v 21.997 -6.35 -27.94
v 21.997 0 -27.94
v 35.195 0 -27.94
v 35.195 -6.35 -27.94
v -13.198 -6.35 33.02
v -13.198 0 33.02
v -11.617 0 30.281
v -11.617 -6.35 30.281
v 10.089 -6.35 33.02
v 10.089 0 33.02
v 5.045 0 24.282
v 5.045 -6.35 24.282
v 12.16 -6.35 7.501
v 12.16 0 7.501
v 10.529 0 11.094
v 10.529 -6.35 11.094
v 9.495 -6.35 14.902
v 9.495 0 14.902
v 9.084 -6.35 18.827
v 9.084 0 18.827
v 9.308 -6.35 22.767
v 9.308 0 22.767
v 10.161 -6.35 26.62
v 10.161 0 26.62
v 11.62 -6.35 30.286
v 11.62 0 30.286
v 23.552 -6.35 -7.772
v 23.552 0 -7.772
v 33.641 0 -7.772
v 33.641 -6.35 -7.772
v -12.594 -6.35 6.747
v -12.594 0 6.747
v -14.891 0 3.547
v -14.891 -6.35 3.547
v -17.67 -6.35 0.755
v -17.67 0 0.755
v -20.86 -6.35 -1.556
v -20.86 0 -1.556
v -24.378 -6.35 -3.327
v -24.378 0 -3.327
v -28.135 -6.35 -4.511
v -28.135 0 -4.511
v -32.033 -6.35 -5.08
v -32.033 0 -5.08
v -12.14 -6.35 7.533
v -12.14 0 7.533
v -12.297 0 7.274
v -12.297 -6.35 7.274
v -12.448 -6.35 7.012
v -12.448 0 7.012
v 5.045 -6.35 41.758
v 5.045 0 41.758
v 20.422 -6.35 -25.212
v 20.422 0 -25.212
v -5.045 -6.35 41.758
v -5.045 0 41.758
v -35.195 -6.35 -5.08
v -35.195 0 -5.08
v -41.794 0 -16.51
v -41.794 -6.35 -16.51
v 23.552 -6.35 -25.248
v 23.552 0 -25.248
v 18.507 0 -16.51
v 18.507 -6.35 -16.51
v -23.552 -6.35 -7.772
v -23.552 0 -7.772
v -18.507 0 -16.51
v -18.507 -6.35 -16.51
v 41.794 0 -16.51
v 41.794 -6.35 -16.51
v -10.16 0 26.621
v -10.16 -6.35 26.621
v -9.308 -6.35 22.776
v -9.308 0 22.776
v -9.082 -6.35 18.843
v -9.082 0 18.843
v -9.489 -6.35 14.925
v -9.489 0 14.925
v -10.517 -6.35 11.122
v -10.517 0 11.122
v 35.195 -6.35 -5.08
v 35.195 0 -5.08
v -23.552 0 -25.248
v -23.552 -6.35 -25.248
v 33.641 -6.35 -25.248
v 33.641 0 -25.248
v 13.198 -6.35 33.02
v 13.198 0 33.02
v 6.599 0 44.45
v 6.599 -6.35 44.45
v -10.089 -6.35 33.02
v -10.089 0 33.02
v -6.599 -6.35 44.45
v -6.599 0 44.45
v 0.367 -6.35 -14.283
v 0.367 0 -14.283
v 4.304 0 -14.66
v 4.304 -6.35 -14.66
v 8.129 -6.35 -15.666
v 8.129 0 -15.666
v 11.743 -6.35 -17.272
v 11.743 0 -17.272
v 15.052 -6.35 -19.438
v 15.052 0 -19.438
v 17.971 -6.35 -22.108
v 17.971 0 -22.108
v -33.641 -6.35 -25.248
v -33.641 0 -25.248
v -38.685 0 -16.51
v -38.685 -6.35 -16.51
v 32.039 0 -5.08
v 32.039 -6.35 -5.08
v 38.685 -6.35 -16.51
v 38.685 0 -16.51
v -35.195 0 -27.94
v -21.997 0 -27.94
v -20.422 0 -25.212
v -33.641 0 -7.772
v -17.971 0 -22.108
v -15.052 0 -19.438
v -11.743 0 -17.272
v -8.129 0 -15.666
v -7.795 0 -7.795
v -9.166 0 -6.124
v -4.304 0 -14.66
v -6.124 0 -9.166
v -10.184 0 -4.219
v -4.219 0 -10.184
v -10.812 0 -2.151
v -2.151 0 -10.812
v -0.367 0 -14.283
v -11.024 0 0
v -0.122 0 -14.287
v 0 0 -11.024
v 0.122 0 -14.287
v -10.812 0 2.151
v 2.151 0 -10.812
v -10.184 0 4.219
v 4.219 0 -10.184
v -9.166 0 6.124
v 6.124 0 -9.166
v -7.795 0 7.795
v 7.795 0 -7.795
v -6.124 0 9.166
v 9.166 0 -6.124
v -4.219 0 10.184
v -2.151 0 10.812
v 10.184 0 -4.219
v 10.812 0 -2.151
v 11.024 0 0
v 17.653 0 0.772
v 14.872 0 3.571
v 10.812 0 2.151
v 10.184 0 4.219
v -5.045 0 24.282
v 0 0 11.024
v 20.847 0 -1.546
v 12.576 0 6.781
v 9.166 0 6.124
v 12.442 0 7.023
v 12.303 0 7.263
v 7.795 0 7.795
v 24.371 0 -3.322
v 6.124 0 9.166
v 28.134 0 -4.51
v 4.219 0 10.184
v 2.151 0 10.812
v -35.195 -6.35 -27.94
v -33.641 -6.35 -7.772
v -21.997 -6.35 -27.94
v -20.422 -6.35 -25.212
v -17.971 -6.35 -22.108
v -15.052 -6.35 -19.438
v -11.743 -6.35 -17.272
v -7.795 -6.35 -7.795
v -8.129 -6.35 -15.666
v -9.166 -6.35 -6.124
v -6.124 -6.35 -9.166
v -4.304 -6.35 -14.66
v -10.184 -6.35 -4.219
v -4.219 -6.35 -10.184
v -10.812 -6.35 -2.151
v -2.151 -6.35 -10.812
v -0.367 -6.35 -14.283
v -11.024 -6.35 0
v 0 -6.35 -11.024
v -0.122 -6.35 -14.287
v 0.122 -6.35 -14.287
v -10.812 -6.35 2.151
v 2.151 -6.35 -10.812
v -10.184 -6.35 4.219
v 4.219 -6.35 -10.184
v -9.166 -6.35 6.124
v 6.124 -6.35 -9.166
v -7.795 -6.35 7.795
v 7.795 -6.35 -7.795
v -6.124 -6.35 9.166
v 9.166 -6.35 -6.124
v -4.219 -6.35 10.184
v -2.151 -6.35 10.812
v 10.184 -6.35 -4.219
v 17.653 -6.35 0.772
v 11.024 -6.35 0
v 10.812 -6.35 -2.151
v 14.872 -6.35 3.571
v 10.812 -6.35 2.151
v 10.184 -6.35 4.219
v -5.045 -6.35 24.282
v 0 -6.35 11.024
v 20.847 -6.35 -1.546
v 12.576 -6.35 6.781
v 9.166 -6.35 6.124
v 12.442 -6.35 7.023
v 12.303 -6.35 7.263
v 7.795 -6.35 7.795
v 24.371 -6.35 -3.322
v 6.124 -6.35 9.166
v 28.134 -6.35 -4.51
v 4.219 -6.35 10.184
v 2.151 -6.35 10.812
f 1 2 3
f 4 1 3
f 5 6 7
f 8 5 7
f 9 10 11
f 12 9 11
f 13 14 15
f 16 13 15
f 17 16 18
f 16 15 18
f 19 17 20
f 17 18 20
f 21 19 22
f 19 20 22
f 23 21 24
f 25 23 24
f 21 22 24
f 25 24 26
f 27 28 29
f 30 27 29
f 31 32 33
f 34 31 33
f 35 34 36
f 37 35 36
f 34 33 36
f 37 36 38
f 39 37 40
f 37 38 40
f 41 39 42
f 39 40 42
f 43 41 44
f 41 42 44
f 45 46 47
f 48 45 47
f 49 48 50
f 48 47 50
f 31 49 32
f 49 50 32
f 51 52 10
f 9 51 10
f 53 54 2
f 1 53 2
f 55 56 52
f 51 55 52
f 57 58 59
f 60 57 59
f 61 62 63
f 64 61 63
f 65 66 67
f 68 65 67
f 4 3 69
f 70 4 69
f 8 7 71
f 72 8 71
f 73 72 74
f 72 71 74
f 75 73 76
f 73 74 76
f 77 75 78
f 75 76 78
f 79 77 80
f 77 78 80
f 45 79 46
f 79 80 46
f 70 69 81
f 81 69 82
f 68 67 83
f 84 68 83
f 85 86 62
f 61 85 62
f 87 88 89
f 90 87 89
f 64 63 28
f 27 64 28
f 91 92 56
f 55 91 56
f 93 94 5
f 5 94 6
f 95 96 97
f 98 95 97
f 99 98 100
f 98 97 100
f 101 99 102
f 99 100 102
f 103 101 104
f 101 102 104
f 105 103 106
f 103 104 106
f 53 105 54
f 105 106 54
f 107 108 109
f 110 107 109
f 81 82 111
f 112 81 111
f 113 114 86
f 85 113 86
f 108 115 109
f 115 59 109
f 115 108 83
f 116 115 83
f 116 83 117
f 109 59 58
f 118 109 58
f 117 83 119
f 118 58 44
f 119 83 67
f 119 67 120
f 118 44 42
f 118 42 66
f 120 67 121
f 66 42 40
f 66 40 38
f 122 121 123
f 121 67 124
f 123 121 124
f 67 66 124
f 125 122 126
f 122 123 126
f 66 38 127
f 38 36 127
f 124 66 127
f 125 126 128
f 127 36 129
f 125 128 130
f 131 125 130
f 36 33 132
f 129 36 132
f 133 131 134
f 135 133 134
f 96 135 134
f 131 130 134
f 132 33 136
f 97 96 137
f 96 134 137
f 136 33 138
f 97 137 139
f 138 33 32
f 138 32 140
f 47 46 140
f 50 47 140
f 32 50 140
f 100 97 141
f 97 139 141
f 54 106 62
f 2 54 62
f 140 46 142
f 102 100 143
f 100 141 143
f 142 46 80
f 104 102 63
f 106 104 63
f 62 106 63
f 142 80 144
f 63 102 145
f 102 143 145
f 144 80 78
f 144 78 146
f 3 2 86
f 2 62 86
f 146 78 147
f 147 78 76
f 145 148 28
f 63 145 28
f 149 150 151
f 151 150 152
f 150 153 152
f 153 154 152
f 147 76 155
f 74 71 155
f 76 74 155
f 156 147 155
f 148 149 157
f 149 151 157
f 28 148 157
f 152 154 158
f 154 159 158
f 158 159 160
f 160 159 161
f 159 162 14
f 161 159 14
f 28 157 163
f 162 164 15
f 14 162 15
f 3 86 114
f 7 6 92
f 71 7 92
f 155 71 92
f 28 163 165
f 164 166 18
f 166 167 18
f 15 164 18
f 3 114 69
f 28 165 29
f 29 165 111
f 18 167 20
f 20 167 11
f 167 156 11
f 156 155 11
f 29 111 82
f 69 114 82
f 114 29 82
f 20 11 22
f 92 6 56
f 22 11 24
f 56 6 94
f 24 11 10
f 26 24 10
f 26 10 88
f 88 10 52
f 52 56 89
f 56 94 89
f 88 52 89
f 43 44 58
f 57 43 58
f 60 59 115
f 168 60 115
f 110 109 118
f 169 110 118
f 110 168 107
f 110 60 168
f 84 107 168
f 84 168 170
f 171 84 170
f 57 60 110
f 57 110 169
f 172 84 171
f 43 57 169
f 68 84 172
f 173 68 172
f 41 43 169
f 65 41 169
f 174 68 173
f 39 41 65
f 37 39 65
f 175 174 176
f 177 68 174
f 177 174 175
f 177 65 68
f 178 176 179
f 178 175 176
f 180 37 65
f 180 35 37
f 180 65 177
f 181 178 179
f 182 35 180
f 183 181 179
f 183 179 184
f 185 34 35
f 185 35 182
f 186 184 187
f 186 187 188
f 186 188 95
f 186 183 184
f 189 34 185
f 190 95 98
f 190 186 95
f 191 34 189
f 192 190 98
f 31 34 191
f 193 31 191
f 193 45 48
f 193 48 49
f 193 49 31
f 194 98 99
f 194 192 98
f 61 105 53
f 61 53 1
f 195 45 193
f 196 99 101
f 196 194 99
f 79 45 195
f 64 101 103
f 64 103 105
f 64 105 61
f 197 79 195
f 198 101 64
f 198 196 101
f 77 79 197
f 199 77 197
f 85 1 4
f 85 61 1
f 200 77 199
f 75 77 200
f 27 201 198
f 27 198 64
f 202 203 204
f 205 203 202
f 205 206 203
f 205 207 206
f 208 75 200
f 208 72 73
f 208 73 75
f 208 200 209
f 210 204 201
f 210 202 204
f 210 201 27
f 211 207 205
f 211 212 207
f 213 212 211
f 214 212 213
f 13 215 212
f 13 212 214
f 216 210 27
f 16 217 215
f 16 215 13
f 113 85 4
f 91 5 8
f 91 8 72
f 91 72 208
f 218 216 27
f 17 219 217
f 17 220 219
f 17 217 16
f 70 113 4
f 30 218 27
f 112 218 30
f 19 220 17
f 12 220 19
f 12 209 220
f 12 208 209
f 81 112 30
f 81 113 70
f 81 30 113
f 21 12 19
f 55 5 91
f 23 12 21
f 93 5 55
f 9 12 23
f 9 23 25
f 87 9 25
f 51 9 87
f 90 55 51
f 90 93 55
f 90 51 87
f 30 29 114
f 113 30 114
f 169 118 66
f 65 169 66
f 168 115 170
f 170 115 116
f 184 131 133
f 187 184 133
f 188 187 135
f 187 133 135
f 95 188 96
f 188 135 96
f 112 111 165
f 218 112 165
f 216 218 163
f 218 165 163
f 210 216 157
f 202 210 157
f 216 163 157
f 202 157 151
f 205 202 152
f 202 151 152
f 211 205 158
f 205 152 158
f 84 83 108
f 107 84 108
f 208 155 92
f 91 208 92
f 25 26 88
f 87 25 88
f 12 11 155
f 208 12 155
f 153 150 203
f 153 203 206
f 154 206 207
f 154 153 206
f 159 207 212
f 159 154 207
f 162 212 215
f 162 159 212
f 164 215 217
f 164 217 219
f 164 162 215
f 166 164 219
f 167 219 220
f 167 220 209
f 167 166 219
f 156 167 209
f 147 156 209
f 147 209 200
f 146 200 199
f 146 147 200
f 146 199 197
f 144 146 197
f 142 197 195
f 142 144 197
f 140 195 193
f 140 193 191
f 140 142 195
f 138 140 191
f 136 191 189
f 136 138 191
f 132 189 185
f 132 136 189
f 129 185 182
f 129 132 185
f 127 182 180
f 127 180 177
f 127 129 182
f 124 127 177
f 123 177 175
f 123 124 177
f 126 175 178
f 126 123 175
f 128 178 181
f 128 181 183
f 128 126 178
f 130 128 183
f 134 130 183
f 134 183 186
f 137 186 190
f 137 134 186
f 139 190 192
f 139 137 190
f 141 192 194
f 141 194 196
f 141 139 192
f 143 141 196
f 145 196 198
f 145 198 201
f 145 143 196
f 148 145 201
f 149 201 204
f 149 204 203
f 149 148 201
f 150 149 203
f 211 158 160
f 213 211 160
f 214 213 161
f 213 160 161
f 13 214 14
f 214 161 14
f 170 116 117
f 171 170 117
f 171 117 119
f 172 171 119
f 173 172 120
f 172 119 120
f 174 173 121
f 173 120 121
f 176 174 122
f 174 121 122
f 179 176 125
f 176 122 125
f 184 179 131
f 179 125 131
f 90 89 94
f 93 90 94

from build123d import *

# Parameters (mm, degrees)
F0_R     = 11.0236
F1_DEPTH = 6.35


with BuildPart() as f1:
    # F0 (on Front) → F1 (new body)
    with BuildSketch(Plane.XZ):
        with BuildLine():
            ThreePointArc((0.3671004027, -14.2827831162), (10.2317545723, -9.9721539611), (14.2875, 0))
            ThreePointArc((14.2875, 0), (13.8530020446, 3.4967113981), (12.5759352613, 6.7807454275))
            ThreePointArc((12.5759352613, 6.7807454275), (12.3650513112, 7.1389657031), (12.1602654275, 7.5007066989))
            ThreePointArc((12.1602654275, 7.5007066989), (0.0192332981, 14.2874870544), (-12.1400270316, 7.5334188734))
            ThreePointArc((-12.1400270316, 7.5334188734), (-12.3634468836, 7.1380393864), (-12.5941456375, 6.7468623753))
            ThreePointArc((-12.5941456375, 6.7468623753), (-12.351516996, -7.1814124061), (-0.3671004027, -14.2827831162))
            ThreePointArc((-0.3671004027, -14.2827831162), (0, -14.2800373238), (0.3671004027, -14.2827831162))
        make_face()
        Circle(F0_R, mode=Mode.SUBTRACT)
        with BuildLine():
            ThreePointArc((12.5759352613, 6.7807454275), (13.8530020446, 3.4967113981), (14.2875, 0))
            ThreePointArc((14.2875, 0), (10.2317545723, -9.9721539611), (0.3671004027, -14.2827831162))
            ThreePointArc((0.3671004027, -14.2827831162), (11.7434168793, -17.2721575555), (20.4219768304, -25.2119014612))
            Line((20.4219768304, -25.2119014612), (15.3979316793, -16.51))
            Line((15.3979316793, -16.51), (21.9970452561, -5.08))
            Line((21.9970452561, -5.08), (32.0385831564, -5.08))
            ThreePointArc((32.0385831564, -5.08), (20.8467310821, -1.5462510774), (12.5759352613, 6.7807454275))
        make_face()
        with BuildLine():
            ThreePointArc((12.1602654275, 7.5007066989), (12.3650513112, 7.1389657031), (12.5759352613, 6.7807454275))
            ThreePointArc((12.5759352613, 6.7807454275), (12.3733379566, 7.14375), (12.1602654275, 7.5007066989))
        make_face()
        with BuildLine():
            ThreePointArc((-0.3671004027, -14.2827831162), (0, -14.2875), (0.3671004027, -14.2827831162))
            ThreePointArc((0.3671004027, -14.2827831162), (0, -14.2800373238), (-0.3671004027, -14.2827831162))
        make_face()
        with BuildLine():
            ThreePointArc((-12.1400270316, 7.5334188734), (0.0192332981, 14.2874870544), (12.1602654275, 7.5007066989))
            ThreePointArc((12.1602654275, 7.5007066989), (9.0842728274, 18.8269242417), (11.619882527, 30.2862269147))
            Line((11.619882527, 30.2862269147), (6.5991135768, 21.59))
            Line((6.5991135768, 21.59), (-6.5991135768, 21.59))
            Line((-6.5991135768, 21.59), (-11.617000966, 30.2812359048))
            ThreePointArc((-11.617000966, 30.2812359048), (-9.0824511669, 18.8430392976), (-12.1400270316, 7.5334188734))
        make_face()
        with BuildLine():
            ThreePointArc((35.1952724098, -5.08), (33.6169277831, -5.1308108988), (32.0385831564, -5.08))
            Line((32.0385831564, -5.08), (21.9970452561, -5.08))
            Line((21.9970452561, -5.08), (15.3979316793, -16.51))
            Line((15.3979316793, -16.51), (20.4219768304, -25.2119014612))
            ThreePointArc((20.4219768304, -25.2119014612), (21.2533288946, -26.5506524823), (21.9970452561, -27.94))
            Line((21.9970452561, -27.94), (35.1952724098, -27.94))
            Line((35.1952724098, -27.94), (41.7943859866, -16.51))
            Line((41.7943859866, -16.51), (35.1952724098, -5.08))
        make_face()
        Polygon((33.640814545, -7.7724), (38.6854702571, -16.51), (33.640814545, -25.2476), (23.5515031209, -25.2476), (18.5068474088, -16.51), (23.5515031209, -7.7724), align=None, mode=Mode.SUBTRACT)
        with BuildLine():
            Line((35.1952724098, -5.08), (32.0385831564, -5.08))
            ThreePointArc((32.0385831564, -5.08), (33.6169277831, -5.1308108988), (35.1952724098, -5.08))
        make_face()
        with BuildLine():
            ThreePointArc((-20.4219768304, -25.2119014612), (-11.7434168793, -17.2721575555), (-0.3671004027, -14.2827831162))
            ThreePointArc((-0.3671004027, -14.2827831162), (-12.351516996, -7.1814124061), (-12.5941456375, 6.7468623753))
            ThreePointArc((-12.5941456375, 6.7468623753), (-20.8597762997, -1.5558862096), (-32.0328200345, -5.08))
            Line((-32.0328200345, -5.08), (-21.9970452561, -5.08))
            Line((-21.9970452561, -5.08), (-15.3979316793, -16.51))
            Line((-15.3979316793, -16.51), (-20.4219768304, -25.2119014612))
        make_face()
        with BuildLine():
            ThreePointArc((21.9970452561, -27.94), (21.2533288946, -26.5506524823), (20.4219768304, -25.2119014612))
            Line((20.4219768304, -25.2119014612), (21.9970452561, -27.94))
        make_face()
        with BuildLine():
            ThreePointArc((-12.5941456375, 6.7468623753), (-12.3634468836, 7.1380393864), (-12.1400270316, 7.5334188734))
            ThreePointArc((-12.1400270316, 7.5334188734), (-12.3733379566, 7.14375), (-12.5941456375, 6.7468623753))
        make_face()
        with BuildLine():
            ThreePointArc((13.1982271537, 33.02), (12.3650513112, 31.6785189067), (11.619882527, 30.2862269147))
            Line((11.619882527, 30.2862269147), (13.1982271537, 33.02))
        make_face()
        with BuildLine():
            Line((6.5991135768, 21.59), (11.619882527, 30.2862269147))
            ThreePointArc((11.619882527, 30.2862269147), (12.3650513112, 31.6785189067), (13.1982271537, 33.02))
            Line((13.1982271537, 33.02), (6.5991135768, 44.45))
            Line((6.5991135768, 44.45), (-6.5991135768, 44.45))
            Line((-6.5991135768, 44.45), (-13.1982271537, 33.02))
            ThreePointArc((-13.1982271537, 33.02), (-12.3634468836, 31.6761178835), (-11.617000966, 30.2812359048))
            Line((-11.617000966, 30.2812359048), (-6.5991135768, 21.59))
            Line((-6.5991135768, 21.59), (6.5991135768, 21.59))
        make_face()
        Polygon((10.0893114241, 33.02), (5.0446557121, 24.2824), (-5.0446557121, 24.2824), (-10.0893114241, 33.02), (-5.0446557121, 41.7576), (5.0446557121, 41.7576), align=None, mode=Mode.SUBTRACT)
        with BuildLine():
            ThreePointArc((-21.9970452561, -27.94), (-21.2533288946, -26.5506524823), (-20.4219768304, -25.2119014612))
            Line((-20.4219768304, -25.2119014612), (-15.3979316793, -16.51))
            Line((-15.3979316793, -16.51), (-21.9970452561, -5.08))
            Line((-21.9970452561, -5.08), (-32.0328200345, -5.08))
            ThreePointArc((-32.0328200345, -5.08), (-33.6140462222, -5.1309998622), (-35.1952724098, -5.08))
            Line((-35.1952724098, -5.08), (-41.7943859866, -16.51))
            Line((-41.7943859866, -16.51), (-35.1952724098, -27.94))
            Line((-35.1952724098, -27.94), (-21.9970452561, -27.94))
        make_face()
        Polygon((-23.5515031209, -25.2476), (-33.640814545, -25.2476), (-38.6854702571, -16.51), (-33.640814545, -7.7724), (-23.5515031209, -7.7724), (-18.5068474088, -16.51), align=None, mode=Mode.SUBTRACT)
        with BuildLine():
            Line((-21.9970452561, -27.94), (-20.4219768304, -25.2119014612))
            ThreePointArc((-20.4219768304, -25.2119014612), (-21.2533288946, -26.5506524823), (-21.9970452561, -27.94))
        make_face()
        with BuildLine():
            Line((-13.1982271537, 33.02), (-11.617000966, 30.2812359048))
            ThreePointArc((-11.617000966, 30.2812359048), (-12.3634468836, 31.6761178835), (-13.1982271537, 33.02))
        make_face()
        with BuildLine():
            ThreePointArc((-35.1952724098, -5.08), (-33.6140462222, -5.1309998622), (-32.0328200345, -5.08))
            Line((-32.0328200345, -5.08), (-35.1952724098, -5.08))
        make_face()
    extrude(amount=F1_DEPTH)


solid = f1.part
